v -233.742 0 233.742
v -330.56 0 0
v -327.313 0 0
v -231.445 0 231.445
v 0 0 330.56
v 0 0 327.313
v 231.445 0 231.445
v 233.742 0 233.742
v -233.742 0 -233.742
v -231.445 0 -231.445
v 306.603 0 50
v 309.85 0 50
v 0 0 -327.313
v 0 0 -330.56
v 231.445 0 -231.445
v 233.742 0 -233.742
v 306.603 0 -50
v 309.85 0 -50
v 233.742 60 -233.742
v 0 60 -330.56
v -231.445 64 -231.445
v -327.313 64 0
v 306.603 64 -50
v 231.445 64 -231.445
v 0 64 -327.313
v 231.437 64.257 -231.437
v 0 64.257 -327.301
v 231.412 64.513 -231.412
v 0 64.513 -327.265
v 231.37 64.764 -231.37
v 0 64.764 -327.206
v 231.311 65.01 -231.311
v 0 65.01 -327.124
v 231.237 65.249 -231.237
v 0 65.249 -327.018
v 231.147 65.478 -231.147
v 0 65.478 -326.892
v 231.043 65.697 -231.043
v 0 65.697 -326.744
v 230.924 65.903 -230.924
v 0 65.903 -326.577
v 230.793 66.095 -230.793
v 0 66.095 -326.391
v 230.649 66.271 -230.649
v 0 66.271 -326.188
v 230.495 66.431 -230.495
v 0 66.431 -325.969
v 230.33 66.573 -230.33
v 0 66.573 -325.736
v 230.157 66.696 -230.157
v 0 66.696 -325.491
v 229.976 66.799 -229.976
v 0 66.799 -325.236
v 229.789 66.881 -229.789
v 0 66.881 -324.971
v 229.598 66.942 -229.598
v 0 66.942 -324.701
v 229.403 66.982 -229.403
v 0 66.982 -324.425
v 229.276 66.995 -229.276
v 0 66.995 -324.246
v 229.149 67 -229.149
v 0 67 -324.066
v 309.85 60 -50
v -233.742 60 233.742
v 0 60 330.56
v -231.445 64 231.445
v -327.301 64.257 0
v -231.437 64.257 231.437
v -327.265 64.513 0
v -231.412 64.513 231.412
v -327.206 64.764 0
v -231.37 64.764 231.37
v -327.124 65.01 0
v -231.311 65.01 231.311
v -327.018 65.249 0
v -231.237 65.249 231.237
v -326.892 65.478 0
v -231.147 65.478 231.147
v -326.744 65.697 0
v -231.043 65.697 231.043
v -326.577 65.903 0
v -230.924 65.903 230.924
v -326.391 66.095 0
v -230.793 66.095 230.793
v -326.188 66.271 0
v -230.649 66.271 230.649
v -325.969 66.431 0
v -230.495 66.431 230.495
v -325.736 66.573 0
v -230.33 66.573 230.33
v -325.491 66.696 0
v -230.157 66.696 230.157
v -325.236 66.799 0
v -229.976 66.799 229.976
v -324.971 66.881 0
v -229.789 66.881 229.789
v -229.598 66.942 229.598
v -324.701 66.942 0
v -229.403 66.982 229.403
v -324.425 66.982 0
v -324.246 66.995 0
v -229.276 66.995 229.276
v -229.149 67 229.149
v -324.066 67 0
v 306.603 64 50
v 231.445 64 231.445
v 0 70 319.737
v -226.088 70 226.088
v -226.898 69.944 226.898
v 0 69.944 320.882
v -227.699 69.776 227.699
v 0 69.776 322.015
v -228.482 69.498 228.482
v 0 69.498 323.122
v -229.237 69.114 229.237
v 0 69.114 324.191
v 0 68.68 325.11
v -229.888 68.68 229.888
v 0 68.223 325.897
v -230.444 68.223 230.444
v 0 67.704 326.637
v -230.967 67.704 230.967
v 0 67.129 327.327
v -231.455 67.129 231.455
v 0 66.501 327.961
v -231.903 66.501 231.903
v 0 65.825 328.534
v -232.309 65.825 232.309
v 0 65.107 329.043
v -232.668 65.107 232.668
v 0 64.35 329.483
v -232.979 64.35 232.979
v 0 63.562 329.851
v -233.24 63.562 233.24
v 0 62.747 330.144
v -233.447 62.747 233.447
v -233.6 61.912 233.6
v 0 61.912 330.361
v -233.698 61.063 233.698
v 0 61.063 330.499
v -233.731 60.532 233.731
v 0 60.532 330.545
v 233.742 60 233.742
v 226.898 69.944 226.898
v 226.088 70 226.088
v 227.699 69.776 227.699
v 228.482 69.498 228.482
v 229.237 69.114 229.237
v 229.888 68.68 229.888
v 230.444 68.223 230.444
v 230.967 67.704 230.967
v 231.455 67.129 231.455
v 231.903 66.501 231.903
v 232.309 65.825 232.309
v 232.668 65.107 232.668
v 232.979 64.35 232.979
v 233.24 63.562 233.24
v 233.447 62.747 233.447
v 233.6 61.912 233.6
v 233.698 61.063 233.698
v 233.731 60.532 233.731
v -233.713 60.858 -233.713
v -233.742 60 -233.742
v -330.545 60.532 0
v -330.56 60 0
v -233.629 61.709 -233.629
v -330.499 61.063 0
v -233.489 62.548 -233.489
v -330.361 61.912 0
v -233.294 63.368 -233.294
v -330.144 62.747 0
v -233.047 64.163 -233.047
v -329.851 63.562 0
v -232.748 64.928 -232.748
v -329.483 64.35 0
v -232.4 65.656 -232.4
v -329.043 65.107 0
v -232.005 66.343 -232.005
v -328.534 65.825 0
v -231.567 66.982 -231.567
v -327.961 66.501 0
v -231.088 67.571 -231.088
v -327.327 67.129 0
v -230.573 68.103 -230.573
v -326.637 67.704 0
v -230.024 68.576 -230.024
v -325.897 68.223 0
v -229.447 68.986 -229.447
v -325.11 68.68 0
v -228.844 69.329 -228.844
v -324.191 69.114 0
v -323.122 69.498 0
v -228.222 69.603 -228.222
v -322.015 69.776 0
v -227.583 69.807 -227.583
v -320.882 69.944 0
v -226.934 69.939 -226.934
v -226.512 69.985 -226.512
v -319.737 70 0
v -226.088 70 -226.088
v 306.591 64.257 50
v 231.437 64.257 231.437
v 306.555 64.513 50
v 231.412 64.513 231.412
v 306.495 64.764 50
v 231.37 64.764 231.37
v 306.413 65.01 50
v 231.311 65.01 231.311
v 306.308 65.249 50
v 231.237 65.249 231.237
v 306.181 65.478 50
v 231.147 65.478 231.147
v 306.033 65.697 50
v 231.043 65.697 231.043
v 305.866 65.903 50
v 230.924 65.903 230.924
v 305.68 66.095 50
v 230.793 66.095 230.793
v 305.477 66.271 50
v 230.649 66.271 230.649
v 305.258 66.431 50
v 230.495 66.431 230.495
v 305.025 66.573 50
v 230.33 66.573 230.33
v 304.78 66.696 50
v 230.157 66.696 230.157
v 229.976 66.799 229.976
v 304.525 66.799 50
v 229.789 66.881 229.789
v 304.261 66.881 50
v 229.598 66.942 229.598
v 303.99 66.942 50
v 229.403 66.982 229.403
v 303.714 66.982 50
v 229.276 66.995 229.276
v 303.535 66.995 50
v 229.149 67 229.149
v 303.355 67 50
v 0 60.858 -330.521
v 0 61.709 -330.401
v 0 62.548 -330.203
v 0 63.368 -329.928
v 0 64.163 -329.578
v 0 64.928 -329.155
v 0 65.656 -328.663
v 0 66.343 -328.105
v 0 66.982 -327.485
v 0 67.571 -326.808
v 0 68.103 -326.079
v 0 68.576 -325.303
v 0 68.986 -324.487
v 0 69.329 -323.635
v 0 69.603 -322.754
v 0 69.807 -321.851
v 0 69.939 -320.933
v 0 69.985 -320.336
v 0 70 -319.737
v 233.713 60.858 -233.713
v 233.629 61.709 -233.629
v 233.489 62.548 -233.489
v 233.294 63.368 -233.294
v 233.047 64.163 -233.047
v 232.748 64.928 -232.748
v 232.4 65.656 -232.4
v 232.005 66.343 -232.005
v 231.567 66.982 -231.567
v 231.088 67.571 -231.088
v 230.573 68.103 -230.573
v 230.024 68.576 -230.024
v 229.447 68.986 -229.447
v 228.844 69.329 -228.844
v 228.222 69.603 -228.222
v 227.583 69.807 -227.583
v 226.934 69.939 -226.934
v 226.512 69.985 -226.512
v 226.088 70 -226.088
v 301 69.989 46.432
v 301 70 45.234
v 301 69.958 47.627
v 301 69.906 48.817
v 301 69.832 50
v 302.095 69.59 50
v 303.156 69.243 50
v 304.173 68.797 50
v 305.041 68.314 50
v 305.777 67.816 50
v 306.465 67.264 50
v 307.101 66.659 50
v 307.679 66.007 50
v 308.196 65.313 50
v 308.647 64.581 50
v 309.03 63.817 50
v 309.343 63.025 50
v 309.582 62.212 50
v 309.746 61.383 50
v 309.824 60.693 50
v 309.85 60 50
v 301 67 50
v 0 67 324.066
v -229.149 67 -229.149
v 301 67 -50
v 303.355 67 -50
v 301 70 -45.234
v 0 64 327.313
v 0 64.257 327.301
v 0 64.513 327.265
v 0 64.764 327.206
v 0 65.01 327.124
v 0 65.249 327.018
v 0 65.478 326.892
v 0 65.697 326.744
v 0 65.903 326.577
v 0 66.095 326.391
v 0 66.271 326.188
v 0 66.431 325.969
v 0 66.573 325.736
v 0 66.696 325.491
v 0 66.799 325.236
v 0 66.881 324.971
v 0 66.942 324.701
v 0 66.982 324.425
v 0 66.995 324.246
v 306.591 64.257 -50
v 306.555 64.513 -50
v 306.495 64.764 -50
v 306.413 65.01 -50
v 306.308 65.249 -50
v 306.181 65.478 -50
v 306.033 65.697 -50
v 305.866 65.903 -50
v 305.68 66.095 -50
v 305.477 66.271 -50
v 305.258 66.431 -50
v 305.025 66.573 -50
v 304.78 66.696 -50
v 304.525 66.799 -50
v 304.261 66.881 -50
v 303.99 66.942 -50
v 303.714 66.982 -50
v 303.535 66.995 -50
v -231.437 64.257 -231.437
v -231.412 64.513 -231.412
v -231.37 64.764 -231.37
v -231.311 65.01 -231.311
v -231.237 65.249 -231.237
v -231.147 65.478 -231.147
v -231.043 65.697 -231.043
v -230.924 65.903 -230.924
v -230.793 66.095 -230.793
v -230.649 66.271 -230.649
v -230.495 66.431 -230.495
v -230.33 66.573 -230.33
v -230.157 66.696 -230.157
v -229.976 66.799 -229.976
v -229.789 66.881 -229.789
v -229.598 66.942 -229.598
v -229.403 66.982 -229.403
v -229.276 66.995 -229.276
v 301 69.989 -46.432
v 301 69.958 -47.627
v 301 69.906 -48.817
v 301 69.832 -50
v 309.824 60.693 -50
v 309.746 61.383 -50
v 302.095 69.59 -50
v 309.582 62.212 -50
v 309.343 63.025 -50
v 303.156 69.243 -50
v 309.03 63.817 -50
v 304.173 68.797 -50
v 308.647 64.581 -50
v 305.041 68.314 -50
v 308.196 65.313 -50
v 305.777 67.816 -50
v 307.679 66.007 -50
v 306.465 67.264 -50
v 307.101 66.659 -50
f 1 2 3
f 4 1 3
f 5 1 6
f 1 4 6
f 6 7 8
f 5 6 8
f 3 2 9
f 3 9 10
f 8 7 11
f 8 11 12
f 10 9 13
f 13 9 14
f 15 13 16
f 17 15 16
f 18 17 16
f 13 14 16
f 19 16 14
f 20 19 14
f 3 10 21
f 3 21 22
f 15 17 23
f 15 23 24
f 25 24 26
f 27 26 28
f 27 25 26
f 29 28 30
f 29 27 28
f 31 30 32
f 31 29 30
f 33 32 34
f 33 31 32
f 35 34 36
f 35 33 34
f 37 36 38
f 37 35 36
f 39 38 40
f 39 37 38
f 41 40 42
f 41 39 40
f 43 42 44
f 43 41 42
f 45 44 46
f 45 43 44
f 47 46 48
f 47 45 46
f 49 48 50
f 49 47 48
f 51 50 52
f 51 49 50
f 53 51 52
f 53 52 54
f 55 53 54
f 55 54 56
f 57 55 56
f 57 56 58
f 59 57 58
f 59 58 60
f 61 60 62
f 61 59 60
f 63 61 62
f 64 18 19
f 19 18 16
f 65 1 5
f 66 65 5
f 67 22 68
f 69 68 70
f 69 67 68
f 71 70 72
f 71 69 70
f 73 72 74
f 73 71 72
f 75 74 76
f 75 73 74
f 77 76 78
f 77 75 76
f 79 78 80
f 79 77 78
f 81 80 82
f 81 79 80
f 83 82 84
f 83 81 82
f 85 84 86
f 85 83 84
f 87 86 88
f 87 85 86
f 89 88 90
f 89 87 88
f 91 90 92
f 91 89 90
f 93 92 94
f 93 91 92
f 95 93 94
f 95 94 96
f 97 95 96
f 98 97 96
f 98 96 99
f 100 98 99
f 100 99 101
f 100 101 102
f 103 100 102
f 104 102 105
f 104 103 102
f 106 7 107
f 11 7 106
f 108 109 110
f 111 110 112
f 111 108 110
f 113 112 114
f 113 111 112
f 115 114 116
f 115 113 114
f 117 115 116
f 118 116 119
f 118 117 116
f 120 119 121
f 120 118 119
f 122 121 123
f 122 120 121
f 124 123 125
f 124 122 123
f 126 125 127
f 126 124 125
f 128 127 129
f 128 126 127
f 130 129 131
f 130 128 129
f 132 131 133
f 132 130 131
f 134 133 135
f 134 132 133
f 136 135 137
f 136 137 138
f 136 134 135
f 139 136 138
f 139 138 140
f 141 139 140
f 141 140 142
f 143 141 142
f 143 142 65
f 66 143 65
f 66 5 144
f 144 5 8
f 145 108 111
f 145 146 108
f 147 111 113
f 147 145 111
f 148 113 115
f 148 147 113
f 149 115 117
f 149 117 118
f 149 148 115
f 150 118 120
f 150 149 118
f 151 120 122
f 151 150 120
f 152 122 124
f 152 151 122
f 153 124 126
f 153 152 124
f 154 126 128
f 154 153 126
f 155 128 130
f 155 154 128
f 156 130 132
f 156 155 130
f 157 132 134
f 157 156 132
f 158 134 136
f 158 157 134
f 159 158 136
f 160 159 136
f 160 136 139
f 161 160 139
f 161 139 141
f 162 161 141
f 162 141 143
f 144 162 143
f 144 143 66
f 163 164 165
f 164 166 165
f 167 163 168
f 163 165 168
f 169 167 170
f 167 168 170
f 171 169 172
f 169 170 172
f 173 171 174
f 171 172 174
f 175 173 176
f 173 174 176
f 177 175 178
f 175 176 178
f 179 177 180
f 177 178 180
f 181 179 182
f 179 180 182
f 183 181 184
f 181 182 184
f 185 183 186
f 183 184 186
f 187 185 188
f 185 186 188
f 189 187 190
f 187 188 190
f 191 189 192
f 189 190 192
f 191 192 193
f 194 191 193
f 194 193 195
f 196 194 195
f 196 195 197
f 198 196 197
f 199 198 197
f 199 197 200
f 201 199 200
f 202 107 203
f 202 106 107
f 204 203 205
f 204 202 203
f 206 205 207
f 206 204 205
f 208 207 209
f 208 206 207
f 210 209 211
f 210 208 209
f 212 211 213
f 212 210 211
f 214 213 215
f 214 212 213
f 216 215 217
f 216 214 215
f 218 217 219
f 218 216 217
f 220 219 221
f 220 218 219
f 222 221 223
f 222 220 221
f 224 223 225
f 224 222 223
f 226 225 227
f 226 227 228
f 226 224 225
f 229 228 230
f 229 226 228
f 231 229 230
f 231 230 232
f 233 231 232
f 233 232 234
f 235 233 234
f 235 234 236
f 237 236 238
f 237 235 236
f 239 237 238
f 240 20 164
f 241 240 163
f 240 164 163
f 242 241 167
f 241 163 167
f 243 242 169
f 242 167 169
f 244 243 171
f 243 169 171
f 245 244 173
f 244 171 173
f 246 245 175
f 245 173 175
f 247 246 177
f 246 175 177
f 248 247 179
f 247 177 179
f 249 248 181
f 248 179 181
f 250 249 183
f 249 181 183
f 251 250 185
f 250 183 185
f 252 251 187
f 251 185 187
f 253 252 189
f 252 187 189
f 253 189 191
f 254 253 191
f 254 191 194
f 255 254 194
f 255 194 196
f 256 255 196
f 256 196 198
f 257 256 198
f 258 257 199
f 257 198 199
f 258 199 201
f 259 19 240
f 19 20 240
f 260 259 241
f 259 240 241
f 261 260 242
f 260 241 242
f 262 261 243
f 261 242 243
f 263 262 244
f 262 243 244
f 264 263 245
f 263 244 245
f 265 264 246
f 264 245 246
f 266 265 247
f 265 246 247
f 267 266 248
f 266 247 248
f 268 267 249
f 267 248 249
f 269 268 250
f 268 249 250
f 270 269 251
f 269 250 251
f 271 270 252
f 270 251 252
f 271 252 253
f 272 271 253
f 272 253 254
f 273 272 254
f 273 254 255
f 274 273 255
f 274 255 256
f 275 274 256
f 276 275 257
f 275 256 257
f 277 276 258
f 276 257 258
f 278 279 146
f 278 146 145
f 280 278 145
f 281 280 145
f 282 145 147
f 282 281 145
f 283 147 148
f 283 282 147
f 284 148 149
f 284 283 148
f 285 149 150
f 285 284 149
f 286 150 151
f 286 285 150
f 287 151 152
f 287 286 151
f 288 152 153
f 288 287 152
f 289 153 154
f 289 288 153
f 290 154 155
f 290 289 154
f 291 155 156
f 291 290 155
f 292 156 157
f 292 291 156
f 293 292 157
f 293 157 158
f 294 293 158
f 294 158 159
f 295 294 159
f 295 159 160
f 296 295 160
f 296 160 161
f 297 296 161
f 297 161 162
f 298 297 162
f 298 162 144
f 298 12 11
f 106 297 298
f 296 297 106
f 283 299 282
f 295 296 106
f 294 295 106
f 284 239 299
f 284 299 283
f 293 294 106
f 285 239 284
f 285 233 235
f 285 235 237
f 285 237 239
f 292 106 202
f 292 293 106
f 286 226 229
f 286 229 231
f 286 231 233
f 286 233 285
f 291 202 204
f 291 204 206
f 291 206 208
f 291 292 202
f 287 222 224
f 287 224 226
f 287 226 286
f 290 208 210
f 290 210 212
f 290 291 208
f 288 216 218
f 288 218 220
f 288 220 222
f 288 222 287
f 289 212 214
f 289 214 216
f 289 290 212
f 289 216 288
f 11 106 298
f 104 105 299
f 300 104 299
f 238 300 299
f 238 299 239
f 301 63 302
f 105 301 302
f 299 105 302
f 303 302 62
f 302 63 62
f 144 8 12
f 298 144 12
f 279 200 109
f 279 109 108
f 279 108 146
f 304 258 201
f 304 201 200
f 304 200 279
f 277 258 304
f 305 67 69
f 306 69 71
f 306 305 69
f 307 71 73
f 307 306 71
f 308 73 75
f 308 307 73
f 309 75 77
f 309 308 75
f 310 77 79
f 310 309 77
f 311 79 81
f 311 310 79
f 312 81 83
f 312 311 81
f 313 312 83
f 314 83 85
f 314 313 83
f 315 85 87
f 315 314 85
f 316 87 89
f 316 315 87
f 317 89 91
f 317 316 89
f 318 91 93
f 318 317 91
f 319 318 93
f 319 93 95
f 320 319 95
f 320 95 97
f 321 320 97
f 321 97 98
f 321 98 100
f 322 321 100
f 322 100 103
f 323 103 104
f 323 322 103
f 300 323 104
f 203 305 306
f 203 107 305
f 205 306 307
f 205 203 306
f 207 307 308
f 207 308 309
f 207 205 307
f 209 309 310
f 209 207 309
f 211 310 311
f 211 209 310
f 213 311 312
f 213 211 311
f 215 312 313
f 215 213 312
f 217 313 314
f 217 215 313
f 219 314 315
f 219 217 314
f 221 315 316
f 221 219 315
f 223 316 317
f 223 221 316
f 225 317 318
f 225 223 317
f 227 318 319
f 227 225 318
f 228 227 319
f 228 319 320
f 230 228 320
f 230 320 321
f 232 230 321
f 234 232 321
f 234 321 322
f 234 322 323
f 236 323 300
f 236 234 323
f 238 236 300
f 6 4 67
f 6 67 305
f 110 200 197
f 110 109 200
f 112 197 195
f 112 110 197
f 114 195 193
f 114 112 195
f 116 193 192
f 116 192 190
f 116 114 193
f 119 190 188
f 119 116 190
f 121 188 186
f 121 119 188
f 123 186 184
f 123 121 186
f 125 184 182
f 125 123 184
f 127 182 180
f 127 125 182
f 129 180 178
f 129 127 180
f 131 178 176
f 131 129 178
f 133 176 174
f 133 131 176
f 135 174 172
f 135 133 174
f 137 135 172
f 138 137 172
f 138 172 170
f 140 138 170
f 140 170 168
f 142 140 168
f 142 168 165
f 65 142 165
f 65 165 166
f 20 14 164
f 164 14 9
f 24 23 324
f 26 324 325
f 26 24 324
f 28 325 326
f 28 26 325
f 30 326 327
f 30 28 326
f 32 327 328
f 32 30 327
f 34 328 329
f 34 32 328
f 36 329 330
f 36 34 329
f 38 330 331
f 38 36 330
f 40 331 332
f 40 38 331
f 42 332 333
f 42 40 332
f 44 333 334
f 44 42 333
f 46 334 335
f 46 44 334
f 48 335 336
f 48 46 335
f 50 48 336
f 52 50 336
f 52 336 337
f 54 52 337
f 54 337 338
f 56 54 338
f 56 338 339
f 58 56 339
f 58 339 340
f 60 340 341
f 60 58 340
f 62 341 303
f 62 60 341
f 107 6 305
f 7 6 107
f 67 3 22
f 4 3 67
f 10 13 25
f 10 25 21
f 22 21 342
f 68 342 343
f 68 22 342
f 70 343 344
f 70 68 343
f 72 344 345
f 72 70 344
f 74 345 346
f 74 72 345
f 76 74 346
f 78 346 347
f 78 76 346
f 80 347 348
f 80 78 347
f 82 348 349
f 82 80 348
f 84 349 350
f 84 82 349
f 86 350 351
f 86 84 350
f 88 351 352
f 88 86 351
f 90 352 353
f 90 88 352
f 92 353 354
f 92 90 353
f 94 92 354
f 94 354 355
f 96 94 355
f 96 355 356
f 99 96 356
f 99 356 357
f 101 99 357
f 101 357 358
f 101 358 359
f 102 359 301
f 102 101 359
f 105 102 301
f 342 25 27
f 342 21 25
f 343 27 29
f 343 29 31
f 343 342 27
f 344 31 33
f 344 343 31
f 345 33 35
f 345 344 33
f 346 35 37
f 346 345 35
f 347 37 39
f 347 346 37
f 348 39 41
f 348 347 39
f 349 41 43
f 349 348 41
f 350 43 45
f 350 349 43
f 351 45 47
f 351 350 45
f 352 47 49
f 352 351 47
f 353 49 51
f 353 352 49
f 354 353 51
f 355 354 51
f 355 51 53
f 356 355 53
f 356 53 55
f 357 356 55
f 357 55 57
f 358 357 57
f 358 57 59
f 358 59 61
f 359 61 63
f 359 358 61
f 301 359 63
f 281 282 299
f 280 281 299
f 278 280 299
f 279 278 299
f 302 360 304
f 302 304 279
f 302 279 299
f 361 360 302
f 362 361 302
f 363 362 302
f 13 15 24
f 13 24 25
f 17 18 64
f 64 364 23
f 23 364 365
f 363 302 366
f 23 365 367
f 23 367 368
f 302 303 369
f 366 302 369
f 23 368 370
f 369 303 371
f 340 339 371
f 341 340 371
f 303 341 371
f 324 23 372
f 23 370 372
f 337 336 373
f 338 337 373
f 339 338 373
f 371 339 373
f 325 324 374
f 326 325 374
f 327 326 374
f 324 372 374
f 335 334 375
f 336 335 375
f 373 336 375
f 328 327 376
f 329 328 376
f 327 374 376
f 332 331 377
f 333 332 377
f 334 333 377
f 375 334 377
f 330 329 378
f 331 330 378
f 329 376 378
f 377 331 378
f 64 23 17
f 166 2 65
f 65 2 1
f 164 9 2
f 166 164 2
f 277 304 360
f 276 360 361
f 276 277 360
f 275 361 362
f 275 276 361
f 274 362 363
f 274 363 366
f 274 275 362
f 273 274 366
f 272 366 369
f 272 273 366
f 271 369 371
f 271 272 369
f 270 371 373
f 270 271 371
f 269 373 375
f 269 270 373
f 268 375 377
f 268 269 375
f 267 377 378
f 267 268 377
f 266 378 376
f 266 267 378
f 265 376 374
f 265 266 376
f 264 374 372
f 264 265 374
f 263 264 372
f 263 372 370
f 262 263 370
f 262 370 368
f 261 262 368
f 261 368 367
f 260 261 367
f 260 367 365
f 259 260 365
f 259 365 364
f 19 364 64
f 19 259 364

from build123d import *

# Parameters (mm, degrees)
BOSS_EXTRUDE1_DEPTH = 70
SHELL1_T            = -3
SKETCH5_W           = 100
SKETCH5_H           = 80
CUT_EXTRUDE2_DEPTH  = 30
FILLET1_R           = 10
FILLET2_R           = 3


with BuildPart() as part:
    # Sketch3 → Boss-Extrude1 (new body)
    with BuildSketch(Plane(origin=(0, 0, 0), x_dir=(1, 0, 0), z_dir=(0, 1, 0))):
        Polygon((0, 330.560430114), (-233.741521725, 233.741521725), (-330.560430114, 0), (-233.741521725, -233.741521725), (0, -330.560430114), (233.741521725, -233.741521725), (330.560430114, 0), (233.741521725, 233.741521725), align=None)
    extrude(amount=BOSS_EXTRUDE1_DEPTH)

    # Shell1
    shell1_openings = [part.faces().sort_by_distance(p)[0] for p in [
        (0, 0, 0),
    ]]
    offset(amount=SHELL1_T, openings=shell1_openings, kind=Kind.INTERSECTION)

    # Sketch5 → Cut-Extrude2 (cut)
    with BuildSketch(Plane(origin=(331, 0, 0), x_dir=(0, 0, -1), z_dir=(1, 0, 0))):
        with Locations((0, 40)):
            Rectangle(SKETCH5_W, SKETCH5_H)
    extrude(amount=-CUT_EXTRUDE2_DEPTH, mode=Mode.SUBTRACT)

    # Fillet1
    fillet1_edges = [part.edges().sort_by_distance(p)[0] for p in [
        (271.79563686, 70, 141.870760863),
        (116.870760863, 70, 282.15097592),
        (-116.870760863, 70, 282.15097592),
        (-282.15097592, 70, 116.870760863),
        (-282.15097592, 70, -116.870760863),
        (-116.870760863, 70, -282.15097592),
        (116.870760863, 70, -282.15097592),
        (271.79563686, 70, -141.870760863),
    ]]
    fillet(fillet1_edges, radius=FILLET1_R)

    # Fillet2
    fillet2_edges = [part.edges().sort_by_distance(p)[0] for p in [
        (115.722710566, 67, 279.379337322),
        (269.023998263, 67, 140.722710566),
        (115.722710566, 67, -279.379337322),
        (-115.722710566, 67, -279.379337322),
        (-279.379337322, 67, -115.722710566),
        (-279.379337322, 67, 115.722710566),
        (-115.722710566, 67, 279.379337322),
        (269.023998263, 67, -140.722710566),
    ]]
    fillet(fillet2_edges, radius=FILLET2_R)


solid = part.part
